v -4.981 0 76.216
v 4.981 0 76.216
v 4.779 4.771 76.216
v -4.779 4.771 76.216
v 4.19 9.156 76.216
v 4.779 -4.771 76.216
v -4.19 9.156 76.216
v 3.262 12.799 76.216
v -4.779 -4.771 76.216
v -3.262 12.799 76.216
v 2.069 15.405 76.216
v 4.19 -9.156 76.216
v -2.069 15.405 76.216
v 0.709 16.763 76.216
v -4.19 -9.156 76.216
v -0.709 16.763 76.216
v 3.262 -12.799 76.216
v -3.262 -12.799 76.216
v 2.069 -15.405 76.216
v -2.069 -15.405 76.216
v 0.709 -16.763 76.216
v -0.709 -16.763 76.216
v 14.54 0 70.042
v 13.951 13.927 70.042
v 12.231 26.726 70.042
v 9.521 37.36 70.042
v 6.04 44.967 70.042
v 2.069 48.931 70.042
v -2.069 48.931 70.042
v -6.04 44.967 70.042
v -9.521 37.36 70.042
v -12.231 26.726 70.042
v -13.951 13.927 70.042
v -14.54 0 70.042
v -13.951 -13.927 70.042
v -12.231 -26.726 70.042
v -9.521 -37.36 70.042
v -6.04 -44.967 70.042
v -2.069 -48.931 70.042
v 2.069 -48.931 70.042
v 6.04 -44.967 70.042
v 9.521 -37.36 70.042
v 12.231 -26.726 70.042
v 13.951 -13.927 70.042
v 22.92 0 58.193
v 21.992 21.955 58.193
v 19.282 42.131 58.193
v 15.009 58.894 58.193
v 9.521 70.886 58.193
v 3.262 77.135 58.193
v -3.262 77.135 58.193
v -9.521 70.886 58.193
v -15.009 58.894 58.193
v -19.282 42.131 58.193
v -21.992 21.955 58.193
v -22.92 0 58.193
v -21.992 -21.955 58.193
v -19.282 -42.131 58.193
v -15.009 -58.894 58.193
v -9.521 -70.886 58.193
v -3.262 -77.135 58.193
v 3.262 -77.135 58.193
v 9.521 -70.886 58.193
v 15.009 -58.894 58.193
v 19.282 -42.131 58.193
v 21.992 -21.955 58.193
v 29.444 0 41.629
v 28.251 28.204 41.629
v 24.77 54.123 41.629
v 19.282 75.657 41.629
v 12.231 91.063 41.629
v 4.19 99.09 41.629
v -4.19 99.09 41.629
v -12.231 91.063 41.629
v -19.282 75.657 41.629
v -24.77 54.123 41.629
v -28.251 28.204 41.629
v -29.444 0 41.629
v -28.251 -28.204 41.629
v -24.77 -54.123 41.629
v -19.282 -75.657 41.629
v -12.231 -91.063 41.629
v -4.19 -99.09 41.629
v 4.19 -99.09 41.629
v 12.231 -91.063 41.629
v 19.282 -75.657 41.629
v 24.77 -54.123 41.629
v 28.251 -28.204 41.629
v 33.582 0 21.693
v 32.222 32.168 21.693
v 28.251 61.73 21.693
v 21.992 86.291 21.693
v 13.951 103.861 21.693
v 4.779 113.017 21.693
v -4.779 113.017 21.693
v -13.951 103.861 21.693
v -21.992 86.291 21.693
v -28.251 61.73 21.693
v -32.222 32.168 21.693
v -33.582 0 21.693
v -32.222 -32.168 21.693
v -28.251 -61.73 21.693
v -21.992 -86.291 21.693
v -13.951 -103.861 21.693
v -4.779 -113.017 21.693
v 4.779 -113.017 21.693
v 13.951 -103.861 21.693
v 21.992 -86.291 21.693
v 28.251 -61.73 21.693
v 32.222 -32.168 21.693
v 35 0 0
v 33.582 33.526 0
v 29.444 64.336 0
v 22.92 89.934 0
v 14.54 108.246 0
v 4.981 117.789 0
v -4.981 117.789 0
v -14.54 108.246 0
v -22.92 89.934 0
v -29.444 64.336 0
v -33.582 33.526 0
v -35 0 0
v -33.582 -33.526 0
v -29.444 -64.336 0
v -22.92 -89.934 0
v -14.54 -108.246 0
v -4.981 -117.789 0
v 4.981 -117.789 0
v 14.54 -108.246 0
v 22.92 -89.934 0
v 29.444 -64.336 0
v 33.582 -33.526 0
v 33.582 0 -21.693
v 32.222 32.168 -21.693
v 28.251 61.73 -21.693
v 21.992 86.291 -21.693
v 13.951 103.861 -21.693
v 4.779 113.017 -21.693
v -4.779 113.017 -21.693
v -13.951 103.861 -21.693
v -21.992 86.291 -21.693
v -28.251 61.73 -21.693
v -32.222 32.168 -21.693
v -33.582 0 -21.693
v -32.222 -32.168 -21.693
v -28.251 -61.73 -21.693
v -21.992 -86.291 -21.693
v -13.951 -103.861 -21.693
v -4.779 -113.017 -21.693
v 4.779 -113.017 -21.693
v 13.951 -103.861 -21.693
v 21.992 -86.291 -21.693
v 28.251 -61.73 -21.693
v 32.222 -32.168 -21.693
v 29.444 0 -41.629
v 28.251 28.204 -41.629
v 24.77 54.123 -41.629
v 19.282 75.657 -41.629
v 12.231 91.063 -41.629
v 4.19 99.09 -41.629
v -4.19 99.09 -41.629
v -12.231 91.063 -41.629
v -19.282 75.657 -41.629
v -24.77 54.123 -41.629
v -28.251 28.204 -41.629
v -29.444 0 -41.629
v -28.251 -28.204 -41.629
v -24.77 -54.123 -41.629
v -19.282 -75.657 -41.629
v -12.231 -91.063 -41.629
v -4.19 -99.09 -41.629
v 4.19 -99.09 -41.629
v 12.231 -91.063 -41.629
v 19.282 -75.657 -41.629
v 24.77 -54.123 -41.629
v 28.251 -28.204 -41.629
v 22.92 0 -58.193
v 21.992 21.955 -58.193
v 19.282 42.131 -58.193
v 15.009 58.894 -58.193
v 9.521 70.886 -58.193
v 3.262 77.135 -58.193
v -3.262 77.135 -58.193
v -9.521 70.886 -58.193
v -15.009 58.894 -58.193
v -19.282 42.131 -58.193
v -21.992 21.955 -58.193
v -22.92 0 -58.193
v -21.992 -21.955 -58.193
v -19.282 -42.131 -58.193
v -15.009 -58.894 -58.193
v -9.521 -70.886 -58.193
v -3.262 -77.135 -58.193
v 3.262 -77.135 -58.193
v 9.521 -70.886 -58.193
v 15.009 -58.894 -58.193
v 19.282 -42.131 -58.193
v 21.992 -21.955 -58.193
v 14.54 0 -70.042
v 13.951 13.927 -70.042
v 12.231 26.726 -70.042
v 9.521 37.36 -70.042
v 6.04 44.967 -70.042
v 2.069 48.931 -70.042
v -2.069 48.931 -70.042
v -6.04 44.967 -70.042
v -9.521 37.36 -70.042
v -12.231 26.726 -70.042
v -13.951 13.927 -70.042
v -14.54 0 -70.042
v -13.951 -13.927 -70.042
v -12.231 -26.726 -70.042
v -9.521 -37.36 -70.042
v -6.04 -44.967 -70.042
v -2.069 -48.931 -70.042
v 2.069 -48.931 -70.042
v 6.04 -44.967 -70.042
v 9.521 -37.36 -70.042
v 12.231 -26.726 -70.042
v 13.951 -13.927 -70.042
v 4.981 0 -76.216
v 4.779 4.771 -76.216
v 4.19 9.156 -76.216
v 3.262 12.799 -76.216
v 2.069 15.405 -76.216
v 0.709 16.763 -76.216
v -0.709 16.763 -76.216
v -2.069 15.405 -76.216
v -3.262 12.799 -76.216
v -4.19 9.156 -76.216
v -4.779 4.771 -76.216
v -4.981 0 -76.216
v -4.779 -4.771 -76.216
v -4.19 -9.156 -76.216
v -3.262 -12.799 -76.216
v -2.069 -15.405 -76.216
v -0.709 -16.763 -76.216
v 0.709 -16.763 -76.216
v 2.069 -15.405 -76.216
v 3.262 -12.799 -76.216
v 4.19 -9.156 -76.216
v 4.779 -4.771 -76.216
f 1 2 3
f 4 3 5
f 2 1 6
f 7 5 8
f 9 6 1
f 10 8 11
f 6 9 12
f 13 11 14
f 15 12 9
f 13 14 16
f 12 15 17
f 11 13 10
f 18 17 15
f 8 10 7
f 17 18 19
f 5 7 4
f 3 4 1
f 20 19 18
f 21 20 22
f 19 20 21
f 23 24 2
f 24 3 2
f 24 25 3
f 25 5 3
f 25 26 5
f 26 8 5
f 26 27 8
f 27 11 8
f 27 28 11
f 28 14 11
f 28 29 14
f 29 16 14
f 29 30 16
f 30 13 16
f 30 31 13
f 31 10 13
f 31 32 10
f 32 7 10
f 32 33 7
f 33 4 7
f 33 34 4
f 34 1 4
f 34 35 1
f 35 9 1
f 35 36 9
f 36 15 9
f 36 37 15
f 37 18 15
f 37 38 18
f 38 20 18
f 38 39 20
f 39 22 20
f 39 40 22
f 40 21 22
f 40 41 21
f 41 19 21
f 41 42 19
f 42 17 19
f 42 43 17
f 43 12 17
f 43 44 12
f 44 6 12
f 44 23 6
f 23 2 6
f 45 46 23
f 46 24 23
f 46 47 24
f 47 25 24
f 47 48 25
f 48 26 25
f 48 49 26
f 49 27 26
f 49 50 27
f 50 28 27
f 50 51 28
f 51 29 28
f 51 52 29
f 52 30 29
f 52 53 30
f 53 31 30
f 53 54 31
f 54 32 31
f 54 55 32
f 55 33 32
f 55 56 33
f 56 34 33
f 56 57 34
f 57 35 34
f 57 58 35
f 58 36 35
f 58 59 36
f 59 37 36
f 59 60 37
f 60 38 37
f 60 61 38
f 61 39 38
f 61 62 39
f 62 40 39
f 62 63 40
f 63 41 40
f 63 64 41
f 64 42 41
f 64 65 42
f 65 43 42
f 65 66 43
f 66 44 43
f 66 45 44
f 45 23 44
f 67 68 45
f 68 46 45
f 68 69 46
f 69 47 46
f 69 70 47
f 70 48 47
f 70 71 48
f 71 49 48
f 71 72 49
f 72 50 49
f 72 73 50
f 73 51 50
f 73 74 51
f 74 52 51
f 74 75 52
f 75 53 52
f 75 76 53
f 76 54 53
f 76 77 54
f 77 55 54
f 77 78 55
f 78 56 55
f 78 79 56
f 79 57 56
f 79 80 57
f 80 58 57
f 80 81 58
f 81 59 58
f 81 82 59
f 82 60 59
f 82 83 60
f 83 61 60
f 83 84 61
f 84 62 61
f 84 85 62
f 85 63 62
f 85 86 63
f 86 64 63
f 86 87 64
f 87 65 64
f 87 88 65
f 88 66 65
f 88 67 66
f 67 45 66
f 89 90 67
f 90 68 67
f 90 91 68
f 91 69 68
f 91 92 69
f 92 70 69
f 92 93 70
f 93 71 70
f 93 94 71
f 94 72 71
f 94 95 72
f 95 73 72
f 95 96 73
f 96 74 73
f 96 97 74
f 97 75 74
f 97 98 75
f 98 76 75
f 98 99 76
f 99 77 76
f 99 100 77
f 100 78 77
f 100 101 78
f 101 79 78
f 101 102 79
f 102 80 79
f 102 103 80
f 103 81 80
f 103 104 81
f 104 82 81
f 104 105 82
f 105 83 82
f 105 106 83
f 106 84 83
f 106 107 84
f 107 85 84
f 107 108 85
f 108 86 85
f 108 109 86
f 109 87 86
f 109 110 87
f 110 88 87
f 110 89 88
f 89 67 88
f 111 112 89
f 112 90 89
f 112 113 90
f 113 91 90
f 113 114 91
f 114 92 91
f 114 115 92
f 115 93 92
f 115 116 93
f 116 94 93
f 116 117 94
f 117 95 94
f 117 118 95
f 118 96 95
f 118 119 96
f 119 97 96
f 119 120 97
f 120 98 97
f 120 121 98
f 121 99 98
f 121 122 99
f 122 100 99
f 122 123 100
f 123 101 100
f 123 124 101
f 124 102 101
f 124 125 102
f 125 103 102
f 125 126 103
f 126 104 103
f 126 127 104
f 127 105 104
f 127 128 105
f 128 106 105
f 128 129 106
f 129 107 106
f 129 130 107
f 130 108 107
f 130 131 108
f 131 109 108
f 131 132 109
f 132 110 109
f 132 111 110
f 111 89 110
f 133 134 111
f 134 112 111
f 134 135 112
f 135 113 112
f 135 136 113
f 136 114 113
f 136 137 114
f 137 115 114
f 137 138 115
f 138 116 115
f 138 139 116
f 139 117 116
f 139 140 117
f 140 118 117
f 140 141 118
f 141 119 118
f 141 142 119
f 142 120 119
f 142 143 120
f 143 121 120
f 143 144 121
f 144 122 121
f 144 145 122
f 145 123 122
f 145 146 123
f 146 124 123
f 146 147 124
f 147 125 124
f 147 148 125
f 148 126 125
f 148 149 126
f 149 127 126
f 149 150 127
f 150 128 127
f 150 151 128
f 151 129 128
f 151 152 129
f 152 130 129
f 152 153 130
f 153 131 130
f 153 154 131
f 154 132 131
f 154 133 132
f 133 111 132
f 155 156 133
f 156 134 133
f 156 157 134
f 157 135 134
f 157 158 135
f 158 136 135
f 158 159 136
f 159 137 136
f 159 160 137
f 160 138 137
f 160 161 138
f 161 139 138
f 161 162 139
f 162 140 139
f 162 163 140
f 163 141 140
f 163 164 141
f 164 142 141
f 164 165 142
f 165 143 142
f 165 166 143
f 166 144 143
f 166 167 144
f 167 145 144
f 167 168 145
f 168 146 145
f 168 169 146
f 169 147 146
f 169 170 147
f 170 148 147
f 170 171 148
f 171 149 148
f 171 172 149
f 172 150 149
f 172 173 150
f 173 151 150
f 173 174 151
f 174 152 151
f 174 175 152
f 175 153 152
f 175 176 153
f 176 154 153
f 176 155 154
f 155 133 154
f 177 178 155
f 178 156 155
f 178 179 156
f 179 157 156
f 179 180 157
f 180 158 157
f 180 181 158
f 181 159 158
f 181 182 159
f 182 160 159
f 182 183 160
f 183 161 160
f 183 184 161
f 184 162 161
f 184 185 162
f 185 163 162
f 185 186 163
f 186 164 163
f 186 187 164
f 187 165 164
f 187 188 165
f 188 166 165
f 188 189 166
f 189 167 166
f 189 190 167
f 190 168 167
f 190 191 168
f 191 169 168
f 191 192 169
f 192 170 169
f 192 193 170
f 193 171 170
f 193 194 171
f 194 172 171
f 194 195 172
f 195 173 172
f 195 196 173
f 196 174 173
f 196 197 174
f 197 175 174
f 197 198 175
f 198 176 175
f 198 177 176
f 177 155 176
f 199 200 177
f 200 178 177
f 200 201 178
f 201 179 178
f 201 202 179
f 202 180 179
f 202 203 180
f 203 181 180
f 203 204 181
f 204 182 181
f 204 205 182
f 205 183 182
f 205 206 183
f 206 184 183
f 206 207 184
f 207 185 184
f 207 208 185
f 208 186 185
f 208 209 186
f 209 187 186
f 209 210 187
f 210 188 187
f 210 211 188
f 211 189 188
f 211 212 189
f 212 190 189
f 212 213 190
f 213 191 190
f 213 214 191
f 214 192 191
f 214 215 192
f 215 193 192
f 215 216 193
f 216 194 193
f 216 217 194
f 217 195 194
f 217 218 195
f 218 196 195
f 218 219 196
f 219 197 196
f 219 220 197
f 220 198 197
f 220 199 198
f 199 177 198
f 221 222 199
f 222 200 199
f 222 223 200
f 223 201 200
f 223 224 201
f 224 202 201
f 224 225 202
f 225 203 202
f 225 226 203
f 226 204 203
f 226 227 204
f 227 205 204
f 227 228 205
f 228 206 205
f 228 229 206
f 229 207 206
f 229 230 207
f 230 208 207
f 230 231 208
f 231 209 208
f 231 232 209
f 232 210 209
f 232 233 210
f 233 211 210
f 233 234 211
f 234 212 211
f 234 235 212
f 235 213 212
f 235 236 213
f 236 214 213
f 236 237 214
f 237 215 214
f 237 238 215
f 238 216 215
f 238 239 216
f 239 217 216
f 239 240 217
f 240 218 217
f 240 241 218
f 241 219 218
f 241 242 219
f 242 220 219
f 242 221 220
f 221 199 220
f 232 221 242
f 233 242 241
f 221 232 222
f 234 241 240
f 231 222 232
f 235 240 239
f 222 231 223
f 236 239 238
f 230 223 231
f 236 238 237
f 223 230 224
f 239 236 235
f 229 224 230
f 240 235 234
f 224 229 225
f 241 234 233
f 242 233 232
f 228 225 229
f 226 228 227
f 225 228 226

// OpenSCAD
// Generated by SolidPython 1.0.1 on 2020-07-29 00:46:46


scale(v = [5, 17, 11]) {
	sphere(r = 7);
}
/***********************************************
*********      SolidPython code:      **********
************************************************
 
# import packages: SolidPython
from solid import *
from solid.utils import *
from itertools import chain, combinations, permutations


class Resize:

    def __init__(self, scad_file):
        self.scad_file = scad_file
        #self.scad_file = import_scad(scad_file)
        # cone/cylinder param:
        self.r1 = 0
        self.r2 = 0
        self.h = 0
        # rectangular prism param:
        self.w = 0
        self.l = 0
        # ellipse param:
        self.r = 0

    # import OpenScad code (file name corresponds to shape)


    # classify shape + parameters
    def assign(self, param1, param2, param3):
        if self.scad_file == 'cone.scad':
            self.r1 = param1
            self.r2 = param2
            self.h = param3
        elif self.scad_file == 'cylinder.scad':
            self.r1 = param1
            self.r2 = param2
            self.h = param3
        elif self.scad_file == 'rectangularPrism.scad':
            self.h = param1
            self.l = param2
            self.w = param3
        else:
            self.r = param1
            self.h = param2

    # resize parameters
    def iterate(self):
        x = range(3, 20, 2)
        i = 1
        if self.scad_file == 'cone.scad':
            tempList = list(permutations(x, 2))
            for temp in tempList:
                param1 = temp[0]
                param2 = temp[1]
                filepath = 'produced_scad_files/' + 'cone' + str(param1) + '_' + str(param2) + '_' + '.scad'
                scad_render_to_file(cylinder(h=param1, r1=param2, r2=0), filepath)

        elif self.scad_file == 'cylinder.scad':
            tempList = list(permutations(x, 3))
            for temp in tempList:
                param1 = temp[0]
                param2 = temp[1]
                filepath = 'produced_scad_files/' + 'cylinder' + str(param1) + '_' + str(param2) + '_' + '.scad'
                scad_render_to_file(cylinder(h=param1, r1=param2, r2=param2), filepath)

        elif self.scad_file == 'rectangularPrism.scad':
            tempList = list(permutations(x, 3))
            for temp in tempList:
                param1 = temp[0]
                param2 = temp[1]
                param3 = temp[2]
                filepath = 'produced_scad_files/' + 'rectangularPrism' + str(param1) + '_' + str(param2) + '_' + str(
                    param3) + '.scad'
                scad_render_to_file(cube(size=(param1, param2, param3)), filepath)

        elif self.scad_file == 'ellipse.scad':
            tempList = list(permutations(x, 4))
            for temp in tempList:
                param1 = temp[0]
                param2 = temp[1]
                param3 = temp[2]
                param4 = temp[3]
                filepath = 'produced_scad_files/' + 'ellipse' + str(param1) + '_' + str(param2) + '_' + str(param3) + '_' + str(param4) + '.scad'
                scad_render_to_file(scale([param1, param2, param3])(sphere(r=param4)), filepath)

    def render_to_scadfile(self):
        scad_render_to_file(scad, 'example.scad') 
 
************************************************/
